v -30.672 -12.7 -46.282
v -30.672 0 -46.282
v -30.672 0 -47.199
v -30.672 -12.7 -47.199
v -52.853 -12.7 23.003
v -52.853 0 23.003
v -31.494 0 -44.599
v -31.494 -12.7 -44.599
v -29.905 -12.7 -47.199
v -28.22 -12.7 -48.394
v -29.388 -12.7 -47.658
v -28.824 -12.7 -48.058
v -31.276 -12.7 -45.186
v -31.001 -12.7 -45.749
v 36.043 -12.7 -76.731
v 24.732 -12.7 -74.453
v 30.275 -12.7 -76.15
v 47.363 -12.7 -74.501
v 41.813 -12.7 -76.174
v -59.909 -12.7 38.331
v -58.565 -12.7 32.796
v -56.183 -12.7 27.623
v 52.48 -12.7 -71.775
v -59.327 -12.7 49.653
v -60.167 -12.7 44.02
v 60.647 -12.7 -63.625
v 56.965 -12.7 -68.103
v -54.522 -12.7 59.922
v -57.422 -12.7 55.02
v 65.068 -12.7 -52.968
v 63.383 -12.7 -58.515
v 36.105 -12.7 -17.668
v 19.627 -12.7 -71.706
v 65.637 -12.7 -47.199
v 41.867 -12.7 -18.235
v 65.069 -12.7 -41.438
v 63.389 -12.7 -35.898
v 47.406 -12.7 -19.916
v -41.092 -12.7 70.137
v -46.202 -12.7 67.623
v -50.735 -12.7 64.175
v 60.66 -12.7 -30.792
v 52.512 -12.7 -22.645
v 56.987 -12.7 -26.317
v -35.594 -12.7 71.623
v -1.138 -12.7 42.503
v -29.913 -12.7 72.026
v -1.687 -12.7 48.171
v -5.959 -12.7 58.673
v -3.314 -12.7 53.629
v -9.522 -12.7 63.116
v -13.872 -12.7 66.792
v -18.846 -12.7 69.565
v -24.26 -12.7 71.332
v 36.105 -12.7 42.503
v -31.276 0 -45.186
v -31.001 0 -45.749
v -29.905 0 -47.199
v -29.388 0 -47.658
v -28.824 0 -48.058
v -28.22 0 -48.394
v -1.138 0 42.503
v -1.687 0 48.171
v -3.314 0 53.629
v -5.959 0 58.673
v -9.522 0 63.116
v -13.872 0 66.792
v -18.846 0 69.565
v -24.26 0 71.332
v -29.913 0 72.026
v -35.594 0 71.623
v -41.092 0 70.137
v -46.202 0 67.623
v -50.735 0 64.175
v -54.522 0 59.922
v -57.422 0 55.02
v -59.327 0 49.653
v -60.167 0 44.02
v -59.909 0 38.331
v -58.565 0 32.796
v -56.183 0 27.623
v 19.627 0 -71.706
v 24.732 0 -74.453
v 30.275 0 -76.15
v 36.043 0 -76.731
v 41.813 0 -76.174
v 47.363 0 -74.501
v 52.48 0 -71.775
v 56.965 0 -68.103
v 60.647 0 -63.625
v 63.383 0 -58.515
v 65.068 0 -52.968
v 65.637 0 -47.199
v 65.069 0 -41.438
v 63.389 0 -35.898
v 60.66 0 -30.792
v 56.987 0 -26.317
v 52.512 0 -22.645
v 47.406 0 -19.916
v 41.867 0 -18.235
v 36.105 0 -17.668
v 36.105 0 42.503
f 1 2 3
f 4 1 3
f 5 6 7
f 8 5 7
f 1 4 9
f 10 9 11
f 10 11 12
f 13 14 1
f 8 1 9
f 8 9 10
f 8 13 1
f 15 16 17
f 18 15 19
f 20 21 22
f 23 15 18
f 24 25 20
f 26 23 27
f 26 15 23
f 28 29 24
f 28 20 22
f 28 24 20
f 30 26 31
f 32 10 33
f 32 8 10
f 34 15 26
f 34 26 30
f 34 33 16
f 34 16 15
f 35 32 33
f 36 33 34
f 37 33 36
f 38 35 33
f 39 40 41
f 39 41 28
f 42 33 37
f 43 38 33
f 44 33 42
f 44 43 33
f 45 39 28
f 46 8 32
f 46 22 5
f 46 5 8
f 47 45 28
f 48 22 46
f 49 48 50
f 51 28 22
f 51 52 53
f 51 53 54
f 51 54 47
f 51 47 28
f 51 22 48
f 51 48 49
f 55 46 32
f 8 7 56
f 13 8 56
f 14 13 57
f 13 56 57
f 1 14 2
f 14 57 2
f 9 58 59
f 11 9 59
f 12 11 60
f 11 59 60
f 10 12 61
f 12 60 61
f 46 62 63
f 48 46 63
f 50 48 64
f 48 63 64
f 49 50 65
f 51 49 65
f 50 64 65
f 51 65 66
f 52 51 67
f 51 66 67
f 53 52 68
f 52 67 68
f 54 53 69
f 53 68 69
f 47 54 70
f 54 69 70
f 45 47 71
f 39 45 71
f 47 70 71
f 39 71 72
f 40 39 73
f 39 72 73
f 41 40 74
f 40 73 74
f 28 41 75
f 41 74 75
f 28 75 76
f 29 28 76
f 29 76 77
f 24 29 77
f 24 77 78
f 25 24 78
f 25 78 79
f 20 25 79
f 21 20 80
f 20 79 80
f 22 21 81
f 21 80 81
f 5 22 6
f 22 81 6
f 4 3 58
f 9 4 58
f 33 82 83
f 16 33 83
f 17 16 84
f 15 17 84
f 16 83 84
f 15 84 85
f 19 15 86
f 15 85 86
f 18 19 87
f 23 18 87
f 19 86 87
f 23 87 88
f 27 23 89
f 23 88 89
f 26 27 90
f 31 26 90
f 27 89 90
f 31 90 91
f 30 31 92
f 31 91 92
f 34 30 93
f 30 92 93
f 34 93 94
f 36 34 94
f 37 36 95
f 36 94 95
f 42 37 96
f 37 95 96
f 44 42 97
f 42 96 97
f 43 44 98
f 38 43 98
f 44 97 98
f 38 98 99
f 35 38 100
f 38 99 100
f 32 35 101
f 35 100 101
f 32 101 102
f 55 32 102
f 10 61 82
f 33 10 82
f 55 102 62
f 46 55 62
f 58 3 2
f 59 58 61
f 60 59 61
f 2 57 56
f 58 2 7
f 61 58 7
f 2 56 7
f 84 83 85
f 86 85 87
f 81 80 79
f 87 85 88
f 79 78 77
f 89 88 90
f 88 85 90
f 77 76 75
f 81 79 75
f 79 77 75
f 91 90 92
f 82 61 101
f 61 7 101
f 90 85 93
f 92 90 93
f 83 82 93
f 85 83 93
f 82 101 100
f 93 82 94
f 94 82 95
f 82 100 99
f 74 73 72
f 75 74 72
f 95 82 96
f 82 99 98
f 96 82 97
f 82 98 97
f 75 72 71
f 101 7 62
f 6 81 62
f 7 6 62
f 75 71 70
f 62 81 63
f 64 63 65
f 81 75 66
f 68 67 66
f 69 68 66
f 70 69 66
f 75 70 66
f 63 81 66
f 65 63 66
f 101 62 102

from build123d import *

# Parameters (mm, degrees)
F1_DEPTH = 12.7


with BuildPart() as f1:
    # F0 (on Front) → F1 (new body)
    with BuildSketch(Plane.XZ):
        with BuildLine():
            Line((-30.6719616055, 12.9689474719), (-30.6719616055, 42.5025746226))
            Line((-30.6719616055, 42.5025746226), (-1.1383344548, 42.5025746226))
            ThreePointArc((-1.1383344548, 42.5025746226), (-41.091738146, 70.1370348042), (-52.8531736535, 23.0031139951))
            ThreePointArc((-52.8531736535, 23.0031139951), (-42.8445811442, 15.5941657836), (-30.6719616055, 12.9689474719))
        make_face()
        with BuildLine():
            Line((-1.1383344548, 42.5025746226), (-30.6719616055, 42.5025746226))
            Line((-30.6719616055, 42.5025746226), (-30.6719616055, 12.9689474719))
            ThreePointArc((-30.6719616055, 12.9689474719), (-9.7885335742, 21.6191465913), (-1.1383344548, 42.5025746226))
        make_face()
        with BuildLine():
            Line((36.1052788794, 42.5025746226), (-1.1383344548, 42.5025746226))
            ThreePointArc((-1.1383344548, 42.5025746226), (-9.7885335742, 21.6191465913), (-30.6719616055, 12.9689474719))
            Line((-30.6719616055, 12.9689474719), (-30.6719616055, -46.2820419996))
            ThreePointArc((-30.6719616055, -46.2820419996), (-30.3101183632, -46.7587404599), (-29.9050042347, -47.1992566308))
            Line((-29.9050042347, -47.1992566308), (6.5738577877, -47.1992566308))
            ThreePointArc((6.5738577877, -47.1992566308), (15.2234107674, -26.3173885188), (36.1052788794, -17.6678355391))
            Line((36.1052788794, -17.6678355391), (36.1052788794, 42.5025746226))
        make_face()
        with BuildLine():
            Line((-30.6719616055, -46.2820419996), (-30.6719616055, 12.9689474719))
            ThreePointArc((-30.6719616055, 12.9689474719), (-42.8445811442, 15.5941657836), (-52.8531736535, 23.0031139951))
            Line((-52.8531736535, 23.0031139951), (-31.4936938255, -44.5985173325))
            ThreePointArc((-31.4936938255, -44.5985173325), (-31.1452529672, -45.4707495734), (-30.6719616055, -46.2820419996))
        make_face()
        with BuildLine():
            ThreePointArc((-29.9050042347, -47.1992566308), (-30.3101183632, -46.7587404599), (-30.6719616055, -46.2820419996))
            Line((-30.6719616055, -46.2820419996), (-30.6719616055, -47.1992566308))
            Line((-30.6719616055, -47.1992566308), (-29.9050042347, -47.1992566308))
        make_face()
        with BuildLine():
            ThreePointArc((65.6366999711, -47.1992566308), (56.9871469914, -26.3173885188), (36.1052788794, -17.6678355391))
            Line((36.1052788794, -17.6678355391), (36.1052788794, -47.1992566308))
            Line((36.1052788794, -47.1992566308), (6.5738577877, -47.1992566308))
            ThreePointArc((6.5738577877, -47.1992566308), (10.040761487, -61.0825474799), (19.6274635862, -71.7061216865))
            ThreePointArc((19.6274635862, -71.7061216865), (49.9885697285, -73.2637740232), (65.6366999711, -47.1992566308))
        make_face()
        with BuildLine():
            Line((36.1052788794, -47.1992566308), (36.1052788794, -17.6678355391))
            ThreePointArc((36.1052788794, -17.6678355391), (15.2234107674, -26.3173885188), (6.5738577877, -47.1992566308))
            Line((6.5738577877, -47.1992566308), (36.1052788794, -47.1992566308))
        make_face()
        with BuildLine():
            Line((6.5738577877, -47.1992566308), (-29.9050042347, -47.1992566308))
            ThreePointArc((-29.9050042347, -47.1992566308), (-29.1114169079, -47.865539345), (-28.2200330558, -48.3938842407))
            Line((-28.2200330558, -48.3938842407), (19.6274635862, -71.7061216865))
            ThreePointArc((19.6274635862, -71.7061216865), (10.040761487, -61.0825474799), (6.5738577877, -47.1992566308))
        make_face()
    extrude(amount=F1_DEPTH)


solid = f1.part
